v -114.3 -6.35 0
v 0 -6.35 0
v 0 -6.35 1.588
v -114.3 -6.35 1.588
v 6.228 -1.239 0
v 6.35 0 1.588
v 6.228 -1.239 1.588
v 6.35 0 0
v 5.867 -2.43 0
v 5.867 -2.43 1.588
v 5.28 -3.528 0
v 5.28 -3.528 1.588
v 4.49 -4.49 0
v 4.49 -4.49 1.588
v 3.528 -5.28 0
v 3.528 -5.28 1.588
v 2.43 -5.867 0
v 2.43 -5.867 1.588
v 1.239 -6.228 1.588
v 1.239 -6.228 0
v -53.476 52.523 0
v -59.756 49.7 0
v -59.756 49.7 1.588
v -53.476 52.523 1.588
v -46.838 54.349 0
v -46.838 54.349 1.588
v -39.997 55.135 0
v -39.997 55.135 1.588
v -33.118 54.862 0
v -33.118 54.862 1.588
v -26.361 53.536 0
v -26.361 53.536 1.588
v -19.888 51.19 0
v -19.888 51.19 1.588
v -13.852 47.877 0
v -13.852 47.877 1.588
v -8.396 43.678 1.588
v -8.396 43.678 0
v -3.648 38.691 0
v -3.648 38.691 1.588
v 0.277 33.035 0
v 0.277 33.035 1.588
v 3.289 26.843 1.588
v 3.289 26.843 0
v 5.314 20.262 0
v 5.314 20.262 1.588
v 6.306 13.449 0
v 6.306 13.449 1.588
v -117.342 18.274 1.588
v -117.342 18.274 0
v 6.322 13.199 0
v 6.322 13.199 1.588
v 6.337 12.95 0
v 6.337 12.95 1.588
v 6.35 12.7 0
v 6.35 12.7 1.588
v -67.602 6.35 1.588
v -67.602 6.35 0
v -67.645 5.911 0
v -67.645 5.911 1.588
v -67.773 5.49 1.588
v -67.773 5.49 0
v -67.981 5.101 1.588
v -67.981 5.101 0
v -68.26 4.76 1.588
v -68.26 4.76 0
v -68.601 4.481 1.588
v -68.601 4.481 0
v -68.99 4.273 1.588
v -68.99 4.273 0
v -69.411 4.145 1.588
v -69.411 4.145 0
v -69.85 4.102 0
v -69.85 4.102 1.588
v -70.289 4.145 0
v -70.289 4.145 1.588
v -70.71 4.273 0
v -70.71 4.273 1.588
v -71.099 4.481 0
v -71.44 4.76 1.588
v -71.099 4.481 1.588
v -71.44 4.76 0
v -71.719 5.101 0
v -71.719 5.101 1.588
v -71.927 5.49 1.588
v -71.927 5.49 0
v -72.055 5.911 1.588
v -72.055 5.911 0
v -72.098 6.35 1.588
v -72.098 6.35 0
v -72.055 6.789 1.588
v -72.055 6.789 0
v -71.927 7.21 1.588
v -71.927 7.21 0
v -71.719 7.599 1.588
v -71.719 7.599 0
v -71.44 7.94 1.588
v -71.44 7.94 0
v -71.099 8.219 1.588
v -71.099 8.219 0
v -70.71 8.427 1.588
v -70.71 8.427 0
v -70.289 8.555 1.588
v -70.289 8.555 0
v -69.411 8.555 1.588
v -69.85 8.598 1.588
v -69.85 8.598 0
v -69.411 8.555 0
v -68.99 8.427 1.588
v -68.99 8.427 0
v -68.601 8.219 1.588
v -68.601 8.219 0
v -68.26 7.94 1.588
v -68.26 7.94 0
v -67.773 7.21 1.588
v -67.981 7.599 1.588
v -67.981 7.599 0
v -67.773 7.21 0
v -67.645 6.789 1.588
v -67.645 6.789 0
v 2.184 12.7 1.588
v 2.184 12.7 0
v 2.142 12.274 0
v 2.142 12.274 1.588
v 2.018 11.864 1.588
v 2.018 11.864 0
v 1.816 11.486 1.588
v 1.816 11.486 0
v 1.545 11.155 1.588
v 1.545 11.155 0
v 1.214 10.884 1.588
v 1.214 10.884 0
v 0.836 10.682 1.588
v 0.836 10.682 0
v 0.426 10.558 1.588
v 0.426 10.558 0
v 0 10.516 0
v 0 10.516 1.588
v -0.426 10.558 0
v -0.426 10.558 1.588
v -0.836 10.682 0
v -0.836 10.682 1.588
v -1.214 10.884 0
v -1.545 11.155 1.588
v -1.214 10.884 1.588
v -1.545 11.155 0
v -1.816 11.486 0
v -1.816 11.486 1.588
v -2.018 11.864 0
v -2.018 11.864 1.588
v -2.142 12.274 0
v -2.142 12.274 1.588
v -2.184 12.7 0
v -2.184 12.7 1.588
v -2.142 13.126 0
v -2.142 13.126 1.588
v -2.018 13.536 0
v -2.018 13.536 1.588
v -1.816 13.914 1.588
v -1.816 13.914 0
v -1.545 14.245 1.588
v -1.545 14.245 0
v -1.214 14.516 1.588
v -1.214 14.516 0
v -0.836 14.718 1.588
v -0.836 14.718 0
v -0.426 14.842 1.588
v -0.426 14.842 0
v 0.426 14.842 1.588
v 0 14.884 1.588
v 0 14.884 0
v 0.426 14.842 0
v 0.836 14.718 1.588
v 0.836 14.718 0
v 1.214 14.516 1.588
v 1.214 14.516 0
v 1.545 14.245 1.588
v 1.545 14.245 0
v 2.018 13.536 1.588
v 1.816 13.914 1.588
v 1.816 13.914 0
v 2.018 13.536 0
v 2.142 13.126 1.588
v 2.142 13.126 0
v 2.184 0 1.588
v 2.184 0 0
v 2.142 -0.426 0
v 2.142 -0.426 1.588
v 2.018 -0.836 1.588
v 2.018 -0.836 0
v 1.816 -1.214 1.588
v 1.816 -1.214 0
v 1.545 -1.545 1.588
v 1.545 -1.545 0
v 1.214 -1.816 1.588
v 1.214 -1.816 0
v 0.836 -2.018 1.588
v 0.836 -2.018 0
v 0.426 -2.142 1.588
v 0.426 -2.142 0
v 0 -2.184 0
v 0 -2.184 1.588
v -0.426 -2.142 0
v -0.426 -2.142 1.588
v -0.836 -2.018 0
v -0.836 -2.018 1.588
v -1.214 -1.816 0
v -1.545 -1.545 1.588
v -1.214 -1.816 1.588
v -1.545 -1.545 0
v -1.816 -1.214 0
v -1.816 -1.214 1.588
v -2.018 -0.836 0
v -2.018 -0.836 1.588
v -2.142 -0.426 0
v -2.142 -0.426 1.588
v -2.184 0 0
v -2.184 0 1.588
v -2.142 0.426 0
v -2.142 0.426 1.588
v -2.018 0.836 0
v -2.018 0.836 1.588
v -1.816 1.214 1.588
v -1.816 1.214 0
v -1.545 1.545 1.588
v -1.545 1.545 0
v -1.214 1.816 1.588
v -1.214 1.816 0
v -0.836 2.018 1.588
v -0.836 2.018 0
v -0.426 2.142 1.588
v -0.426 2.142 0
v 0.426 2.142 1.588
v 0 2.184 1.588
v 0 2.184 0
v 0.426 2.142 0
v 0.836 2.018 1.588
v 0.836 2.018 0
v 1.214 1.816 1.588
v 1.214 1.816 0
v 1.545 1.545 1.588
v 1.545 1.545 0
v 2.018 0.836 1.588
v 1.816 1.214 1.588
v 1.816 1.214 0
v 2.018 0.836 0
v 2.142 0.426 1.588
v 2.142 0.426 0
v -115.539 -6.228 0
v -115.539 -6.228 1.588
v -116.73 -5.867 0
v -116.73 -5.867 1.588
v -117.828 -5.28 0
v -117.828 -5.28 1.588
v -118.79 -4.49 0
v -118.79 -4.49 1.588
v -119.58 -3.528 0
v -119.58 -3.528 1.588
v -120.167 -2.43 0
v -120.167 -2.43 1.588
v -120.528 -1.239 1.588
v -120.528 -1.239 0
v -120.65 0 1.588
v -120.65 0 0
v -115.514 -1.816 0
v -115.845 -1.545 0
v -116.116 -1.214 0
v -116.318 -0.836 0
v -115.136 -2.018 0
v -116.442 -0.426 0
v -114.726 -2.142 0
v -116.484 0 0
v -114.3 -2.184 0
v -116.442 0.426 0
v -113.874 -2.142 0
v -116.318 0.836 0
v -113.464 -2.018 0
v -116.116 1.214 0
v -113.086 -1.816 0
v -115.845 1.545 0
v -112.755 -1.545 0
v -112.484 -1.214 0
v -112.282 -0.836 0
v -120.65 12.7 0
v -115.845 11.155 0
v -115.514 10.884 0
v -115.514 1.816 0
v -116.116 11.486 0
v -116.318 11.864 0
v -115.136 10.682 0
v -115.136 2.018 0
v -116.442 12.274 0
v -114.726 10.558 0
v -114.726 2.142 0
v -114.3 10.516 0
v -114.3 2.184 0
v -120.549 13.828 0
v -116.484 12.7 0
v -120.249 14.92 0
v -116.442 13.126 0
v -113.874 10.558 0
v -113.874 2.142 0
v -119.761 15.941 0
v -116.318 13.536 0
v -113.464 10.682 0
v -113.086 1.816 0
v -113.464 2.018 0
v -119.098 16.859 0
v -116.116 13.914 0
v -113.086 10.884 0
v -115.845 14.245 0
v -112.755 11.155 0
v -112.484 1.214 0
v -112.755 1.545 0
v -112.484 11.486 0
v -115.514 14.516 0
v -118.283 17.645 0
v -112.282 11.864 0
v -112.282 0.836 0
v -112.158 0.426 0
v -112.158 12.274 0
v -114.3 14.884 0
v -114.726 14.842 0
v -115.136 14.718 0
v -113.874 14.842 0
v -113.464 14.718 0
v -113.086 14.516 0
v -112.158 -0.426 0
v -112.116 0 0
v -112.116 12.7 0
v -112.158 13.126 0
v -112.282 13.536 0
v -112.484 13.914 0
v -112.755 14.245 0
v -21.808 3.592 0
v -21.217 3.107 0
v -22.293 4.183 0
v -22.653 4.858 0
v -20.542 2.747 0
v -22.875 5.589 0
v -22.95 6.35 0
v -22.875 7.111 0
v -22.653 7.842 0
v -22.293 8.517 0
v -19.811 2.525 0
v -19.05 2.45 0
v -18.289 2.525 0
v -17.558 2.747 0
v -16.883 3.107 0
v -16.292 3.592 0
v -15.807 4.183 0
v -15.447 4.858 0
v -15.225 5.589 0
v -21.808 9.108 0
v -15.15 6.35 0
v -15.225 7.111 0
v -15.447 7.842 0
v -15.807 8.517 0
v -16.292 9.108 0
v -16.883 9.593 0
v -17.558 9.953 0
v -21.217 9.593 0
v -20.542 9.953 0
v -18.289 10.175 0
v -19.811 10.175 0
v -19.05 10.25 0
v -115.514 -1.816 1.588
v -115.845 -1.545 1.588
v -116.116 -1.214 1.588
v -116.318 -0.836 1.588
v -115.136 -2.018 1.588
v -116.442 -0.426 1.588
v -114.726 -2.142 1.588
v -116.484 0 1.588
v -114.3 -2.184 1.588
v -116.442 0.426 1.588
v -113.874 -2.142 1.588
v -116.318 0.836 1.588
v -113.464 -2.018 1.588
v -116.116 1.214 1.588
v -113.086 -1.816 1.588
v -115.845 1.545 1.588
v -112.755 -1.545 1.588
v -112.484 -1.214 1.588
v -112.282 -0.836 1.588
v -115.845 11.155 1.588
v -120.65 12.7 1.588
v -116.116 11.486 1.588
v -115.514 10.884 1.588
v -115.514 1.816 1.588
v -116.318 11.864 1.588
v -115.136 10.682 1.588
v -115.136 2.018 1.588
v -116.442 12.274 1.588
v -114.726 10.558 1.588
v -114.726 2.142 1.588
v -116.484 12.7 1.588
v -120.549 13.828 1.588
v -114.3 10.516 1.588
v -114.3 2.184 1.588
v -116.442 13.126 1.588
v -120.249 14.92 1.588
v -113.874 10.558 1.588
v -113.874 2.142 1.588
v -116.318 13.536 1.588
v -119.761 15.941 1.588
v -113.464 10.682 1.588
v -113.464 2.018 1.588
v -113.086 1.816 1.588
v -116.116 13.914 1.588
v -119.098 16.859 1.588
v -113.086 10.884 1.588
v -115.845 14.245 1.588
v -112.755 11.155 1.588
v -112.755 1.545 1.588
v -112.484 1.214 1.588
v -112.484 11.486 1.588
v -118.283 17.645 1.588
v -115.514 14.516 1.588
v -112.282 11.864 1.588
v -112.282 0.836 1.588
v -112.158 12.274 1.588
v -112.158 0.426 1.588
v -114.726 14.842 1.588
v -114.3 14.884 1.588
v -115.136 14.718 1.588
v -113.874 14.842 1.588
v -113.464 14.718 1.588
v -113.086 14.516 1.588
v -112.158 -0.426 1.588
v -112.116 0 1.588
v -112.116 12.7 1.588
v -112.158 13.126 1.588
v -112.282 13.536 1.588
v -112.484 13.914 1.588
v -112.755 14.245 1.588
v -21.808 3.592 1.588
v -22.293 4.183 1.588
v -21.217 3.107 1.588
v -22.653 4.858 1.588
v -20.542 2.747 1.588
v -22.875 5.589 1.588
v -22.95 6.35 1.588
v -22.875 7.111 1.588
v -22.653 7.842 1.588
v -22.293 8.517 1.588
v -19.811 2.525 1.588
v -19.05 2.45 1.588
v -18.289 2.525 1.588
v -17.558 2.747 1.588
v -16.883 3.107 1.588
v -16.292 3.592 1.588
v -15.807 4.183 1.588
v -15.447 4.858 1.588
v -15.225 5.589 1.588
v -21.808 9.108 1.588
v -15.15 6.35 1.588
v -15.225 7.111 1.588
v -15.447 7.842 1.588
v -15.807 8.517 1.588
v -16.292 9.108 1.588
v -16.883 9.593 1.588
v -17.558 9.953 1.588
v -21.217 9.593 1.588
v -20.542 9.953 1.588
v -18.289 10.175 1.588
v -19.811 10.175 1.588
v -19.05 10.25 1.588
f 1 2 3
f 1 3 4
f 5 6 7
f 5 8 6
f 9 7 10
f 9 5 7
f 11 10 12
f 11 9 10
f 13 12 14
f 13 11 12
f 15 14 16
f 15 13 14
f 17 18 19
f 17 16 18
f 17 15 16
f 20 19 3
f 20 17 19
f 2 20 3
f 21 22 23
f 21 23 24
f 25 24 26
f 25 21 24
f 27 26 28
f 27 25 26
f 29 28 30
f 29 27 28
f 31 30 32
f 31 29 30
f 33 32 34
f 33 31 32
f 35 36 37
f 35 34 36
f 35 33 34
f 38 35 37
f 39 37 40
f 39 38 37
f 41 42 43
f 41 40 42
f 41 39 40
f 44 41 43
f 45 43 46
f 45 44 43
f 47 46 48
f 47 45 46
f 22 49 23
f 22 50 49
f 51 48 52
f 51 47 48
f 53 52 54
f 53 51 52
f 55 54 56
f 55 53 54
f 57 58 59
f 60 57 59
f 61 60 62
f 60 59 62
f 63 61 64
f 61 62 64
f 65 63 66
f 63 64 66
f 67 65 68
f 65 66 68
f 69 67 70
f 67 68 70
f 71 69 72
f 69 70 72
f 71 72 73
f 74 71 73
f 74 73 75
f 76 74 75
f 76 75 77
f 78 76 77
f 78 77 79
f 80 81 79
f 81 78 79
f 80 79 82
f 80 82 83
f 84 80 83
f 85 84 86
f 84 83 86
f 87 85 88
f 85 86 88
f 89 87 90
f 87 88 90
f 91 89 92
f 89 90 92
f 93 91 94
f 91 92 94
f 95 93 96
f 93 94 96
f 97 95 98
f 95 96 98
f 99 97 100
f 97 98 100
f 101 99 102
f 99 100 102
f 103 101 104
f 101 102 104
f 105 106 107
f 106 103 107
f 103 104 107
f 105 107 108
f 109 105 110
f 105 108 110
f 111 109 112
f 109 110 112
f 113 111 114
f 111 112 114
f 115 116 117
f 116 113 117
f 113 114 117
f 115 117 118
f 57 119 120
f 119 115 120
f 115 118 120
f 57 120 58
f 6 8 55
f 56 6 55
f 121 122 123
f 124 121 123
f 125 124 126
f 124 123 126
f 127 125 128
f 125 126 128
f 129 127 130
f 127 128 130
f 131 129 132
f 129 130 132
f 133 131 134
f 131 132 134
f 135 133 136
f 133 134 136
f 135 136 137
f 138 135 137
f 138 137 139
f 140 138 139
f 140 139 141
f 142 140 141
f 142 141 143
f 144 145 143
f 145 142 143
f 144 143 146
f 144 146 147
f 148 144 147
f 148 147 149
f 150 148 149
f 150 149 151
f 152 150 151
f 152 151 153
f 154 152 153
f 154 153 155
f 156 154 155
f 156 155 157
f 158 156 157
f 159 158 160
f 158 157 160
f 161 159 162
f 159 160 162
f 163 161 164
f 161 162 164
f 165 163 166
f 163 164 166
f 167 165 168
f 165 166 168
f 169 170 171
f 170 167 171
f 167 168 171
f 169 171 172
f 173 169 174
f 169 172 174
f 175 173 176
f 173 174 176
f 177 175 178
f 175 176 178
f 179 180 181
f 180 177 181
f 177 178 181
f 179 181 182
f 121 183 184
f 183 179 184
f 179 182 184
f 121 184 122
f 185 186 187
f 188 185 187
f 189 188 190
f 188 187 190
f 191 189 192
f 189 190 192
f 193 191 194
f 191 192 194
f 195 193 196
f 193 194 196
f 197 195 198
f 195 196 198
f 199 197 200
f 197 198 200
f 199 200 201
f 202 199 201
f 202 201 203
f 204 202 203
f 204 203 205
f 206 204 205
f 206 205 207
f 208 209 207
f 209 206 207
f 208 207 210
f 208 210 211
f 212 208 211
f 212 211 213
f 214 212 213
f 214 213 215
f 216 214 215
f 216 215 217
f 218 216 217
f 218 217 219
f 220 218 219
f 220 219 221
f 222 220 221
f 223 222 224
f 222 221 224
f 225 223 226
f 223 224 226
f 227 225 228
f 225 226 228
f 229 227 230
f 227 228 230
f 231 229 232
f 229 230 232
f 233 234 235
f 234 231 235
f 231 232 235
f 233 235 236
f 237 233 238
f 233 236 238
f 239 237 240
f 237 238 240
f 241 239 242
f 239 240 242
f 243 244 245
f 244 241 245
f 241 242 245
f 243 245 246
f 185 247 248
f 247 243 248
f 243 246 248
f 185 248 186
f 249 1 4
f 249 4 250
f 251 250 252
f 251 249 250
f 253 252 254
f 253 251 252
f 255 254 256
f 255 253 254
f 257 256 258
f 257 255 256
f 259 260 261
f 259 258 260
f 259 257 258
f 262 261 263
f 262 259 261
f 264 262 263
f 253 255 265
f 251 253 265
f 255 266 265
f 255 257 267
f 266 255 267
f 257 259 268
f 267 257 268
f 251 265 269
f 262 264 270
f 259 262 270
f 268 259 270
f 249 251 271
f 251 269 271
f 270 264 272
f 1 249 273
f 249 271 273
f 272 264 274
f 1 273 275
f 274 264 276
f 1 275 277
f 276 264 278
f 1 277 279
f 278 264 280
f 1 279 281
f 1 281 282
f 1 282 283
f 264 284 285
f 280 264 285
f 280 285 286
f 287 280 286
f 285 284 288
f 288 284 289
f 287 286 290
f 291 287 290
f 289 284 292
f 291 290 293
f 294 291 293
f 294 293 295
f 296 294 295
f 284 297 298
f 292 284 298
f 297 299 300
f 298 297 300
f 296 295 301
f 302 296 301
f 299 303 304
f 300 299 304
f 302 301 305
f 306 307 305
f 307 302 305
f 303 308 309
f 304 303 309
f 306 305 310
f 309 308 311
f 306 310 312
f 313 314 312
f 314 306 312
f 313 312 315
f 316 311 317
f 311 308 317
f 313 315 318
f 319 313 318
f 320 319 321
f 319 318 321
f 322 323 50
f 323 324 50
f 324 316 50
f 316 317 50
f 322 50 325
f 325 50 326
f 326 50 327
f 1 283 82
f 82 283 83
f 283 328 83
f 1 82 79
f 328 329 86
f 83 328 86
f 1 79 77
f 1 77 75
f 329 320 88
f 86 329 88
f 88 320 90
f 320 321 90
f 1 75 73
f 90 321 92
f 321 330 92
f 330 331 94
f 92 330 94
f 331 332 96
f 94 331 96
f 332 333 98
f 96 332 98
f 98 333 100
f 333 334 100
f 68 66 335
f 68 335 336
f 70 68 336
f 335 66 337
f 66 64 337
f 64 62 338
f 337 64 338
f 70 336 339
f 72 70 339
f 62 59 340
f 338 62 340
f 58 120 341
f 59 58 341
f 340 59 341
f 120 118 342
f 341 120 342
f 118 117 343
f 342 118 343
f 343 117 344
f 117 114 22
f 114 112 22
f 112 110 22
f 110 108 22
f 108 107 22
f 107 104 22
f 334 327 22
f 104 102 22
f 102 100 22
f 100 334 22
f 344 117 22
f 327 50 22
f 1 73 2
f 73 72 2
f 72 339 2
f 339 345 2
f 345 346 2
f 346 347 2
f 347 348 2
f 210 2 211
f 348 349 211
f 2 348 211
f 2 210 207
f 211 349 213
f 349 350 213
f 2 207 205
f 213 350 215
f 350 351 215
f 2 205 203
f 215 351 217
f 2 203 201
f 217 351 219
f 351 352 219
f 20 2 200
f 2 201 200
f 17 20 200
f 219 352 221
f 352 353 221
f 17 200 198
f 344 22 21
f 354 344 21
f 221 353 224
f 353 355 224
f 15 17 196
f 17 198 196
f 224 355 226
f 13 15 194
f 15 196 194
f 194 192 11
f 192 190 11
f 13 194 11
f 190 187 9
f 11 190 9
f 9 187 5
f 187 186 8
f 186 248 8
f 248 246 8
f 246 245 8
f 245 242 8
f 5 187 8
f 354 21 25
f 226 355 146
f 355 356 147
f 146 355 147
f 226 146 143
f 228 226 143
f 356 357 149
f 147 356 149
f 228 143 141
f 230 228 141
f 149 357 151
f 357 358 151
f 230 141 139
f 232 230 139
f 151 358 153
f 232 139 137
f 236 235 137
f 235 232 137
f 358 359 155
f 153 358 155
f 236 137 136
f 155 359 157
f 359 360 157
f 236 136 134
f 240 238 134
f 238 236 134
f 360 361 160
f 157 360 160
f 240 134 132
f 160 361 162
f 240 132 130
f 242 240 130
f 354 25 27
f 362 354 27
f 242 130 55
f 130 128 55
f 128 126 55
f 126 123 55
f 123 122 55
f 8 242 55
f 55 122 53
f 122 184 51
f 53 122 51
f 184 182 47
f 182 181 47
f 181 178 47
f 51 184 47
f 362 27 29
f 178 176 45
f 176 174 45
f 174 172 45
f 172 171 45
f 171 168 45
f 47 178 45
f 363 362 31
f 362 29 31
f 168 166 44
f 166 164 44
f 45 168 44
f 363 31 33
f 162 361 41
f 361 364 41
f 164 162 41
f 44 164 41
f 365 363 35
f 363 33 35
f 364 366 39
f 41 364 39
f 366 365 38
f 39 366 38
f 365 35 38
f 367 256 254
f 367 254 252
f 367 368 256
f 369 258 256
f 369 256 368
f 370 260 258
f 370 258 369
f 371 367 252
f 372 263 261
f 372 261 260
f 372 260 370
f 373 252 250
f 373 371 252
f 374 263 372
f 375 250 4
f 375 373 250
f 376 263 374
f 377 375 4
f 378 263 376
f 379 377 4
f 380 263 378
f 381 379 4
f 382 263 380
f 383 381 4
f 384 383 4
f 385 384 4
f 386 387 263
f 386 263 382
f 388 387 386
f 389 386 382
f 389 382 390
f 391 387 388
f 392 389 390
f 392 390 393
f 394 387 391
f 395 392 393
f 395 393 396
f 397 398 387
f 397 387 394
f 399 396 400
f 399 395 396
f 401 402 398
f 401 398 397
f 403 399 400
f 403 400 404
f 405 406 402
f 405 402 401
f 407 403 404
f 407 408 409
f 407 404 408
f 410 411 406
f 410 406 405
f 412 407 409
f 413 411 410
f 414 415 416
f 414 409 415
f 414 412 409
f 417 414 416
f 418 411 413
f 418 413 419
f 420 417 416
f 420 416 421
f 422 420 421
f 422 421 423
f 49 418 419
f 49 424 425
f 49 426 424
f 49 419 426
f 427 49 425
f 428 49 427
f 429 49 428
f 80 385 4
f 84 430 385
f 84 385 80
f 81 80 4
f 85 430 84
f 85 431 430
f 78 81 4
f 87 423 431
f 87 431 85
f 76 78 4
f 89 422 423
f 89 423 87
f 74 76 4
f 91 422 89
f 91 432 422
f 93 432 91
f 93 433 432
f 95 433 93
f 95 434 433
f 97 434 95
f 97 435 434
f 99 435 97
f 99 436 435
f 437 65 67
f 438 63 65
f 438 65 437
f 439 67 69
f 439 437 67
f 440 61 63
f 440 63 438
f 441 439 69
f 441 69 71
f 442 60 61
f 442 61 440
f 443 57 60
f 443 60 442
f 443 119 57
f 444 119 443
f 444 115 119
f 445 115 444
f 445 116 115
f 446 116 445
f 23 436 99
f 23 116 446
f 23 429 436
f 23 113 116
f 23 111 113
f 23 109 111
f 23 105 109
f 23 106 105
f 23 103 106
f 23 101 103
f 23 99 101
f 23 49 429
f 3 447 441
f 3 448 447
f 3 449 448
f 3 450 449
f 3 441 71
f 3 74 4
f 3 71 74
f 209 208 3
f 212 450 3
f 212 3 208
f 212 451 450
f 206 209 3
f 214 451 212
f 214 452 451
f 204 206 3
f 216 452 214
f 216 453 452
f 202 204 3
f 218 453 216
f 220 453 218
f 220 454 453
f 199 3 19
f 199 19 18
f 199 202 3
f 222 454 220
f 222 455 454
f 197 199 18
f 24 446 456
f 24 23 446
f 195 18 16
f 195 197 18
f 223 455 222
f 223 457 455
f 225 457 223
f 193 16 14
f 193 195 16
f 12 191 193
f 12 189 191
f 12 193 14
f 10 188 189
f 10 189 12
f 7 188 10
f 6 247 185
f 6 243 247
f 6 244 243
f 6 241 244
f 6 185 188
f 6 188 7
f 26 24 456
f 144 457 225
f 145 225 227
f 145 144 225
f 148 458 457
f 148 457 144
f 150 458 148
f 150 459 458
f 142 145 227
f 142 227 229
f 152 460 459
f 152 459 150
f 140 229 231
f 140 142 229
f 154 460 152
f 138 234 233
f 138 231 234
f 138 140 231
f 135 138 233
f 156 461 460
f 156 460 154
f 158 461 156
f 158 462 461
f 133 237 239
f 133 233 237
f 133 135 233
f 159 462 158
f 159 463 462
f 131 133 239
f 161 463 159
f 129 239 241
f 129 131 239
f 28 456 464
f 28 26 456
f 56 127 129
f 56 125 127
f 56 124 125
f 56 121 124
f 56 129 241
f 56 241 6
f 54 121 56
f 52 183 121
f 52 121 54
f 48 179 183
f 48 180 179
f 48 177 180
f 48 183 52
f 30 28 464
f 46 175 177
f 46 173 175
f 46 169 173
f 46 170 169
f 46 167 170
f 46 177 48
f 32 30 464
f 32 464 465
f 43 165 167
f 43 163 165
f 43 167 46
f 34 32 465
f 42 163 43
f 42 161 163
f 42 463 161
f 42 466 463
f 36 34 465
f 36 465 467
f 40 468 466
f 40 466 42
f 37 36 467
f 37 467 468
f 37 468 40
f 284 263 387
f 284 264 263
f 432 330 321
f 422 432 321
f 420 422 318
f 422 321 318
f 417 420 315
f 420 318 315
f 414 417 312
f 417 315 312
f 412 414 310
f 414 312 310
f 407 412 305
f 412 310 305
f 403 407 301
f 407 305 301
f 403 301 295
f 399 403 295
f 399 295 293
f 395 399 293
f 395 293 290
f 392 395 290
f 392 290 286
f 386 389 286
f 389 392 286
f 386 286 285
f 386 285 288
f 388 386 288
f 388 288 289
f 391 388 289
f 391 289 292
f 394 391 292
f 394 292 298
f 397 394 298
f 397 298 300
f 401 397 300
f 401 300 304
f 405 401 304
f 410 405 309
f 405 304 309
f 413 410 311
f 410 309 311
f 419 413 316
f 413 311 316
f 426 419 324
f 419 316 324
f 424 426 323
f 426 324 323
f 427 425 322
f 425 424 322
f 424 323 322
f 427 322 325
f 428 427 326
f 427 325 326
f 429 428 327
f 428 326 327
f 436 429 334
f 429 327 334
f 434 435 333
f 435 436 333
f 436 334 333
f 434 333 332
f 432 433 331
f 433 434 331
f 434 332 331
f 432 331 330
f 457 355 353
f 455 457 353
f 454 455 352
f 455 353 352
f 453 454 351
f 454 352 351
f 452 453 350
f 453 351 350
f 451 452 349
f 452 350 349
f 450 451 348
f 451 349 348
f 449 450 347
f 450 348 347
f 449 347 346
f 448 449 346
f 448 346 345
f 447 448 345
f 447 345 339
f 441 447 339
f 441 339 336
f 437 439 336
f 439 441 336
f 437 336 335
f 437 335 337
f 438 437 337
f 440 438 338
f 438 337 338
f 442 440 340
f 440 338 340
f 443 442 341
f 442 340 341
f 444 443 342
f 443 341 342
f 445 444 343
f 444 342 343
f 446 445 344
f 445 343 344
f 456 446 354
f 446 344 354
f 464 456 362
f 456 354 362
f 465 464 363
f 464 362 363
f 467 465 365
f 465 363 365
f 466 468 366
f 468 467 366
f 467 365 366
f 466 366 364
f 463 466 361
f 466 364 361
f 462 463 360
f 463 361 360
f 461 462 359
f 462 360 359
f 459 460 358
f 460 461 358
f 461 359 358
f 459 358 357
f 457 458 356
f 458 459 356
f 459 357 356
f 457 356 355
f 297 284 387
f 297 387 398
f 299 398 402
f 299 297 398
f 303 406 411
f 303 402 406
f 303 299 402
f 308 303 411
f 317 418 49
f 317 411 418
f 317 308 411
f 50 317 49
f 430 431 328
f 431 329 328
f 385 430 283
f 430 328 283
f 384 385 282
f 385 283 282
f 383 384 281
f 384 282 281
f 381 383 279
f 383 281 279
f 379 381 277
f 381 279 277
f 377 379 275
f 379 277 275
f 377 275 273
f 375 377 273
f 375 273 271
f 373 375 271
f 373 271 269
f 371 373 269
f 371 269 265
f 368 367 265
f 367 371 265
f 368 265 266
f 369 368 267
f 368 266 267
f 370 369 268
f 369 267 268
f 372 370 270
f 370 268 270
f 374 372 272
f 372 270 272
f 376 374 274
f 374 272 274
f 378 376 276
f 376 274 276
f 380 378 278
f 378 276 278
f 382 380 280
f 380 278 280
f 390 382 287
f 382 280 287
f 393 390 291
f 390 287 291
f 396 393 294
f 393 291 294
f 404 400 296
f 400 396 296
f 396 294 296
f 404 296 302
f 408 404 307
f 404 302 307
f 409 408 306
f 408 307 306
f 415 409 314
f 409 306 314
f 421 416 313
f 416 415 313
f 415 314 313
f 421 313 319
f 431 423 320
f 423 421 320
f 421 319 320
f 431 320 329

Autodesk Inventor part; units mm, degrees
ref_plane "YZ Plane" through (0, 0, 0) normal (1, 0, 0) x (0, 1, 0)
ref_plane "XZ Plane" through (0, 0, 0) normal (0, 1, 0) x (-1, 0, 0)
ref_plane "XY Plane" through (0, 0, 0) normal (0, 0, 1) x (1, 0, 0)
sketch "main" plane through (0, 0, 0) normal (0, 0, 1) x (1, 0, 0)
  circle A0 centre (50.5981, -28.4488) radius 2.1844
  line L0 (-66.7437, -10.1747) -> (-9.1578, 21.251)
  line L1 (50.5981, -34.7988) -> (-63.7019, -34.7988)
  circle A1 centre (50.5981, -15.7488) radius 2.1844
  arc A2 (50.5981, -34.7988) -> (56.9481, -28.4488) centre (50.5981, -28.4488) ccw
  line L2 (56.9481, -28.4488) -> (56.9481, -15.7488)
  arc A3 (56.9481, -15.7488) -> (56.9038, -14.9999) centre (50.5981, -15.7488) ccw
  arc A4 (56.9481, -15.7488) -> (-9.1578, 21.251) centre (12.2713, -18.0166) ccw
  circle A5 centre (31.5481, -22.0988) radius 3.9
  circle A6 centre (-19.2519, -22.0988) radius 2.2479
  circle A7 centre (-63.7019, -28.4488) radius 2.1844
  circle A8 centre (-63.7019, -15.7488) radius 2.1844
  arc A9 (-66.7437, -10.1747) -> (-70.0519, -15.7488) centre (-63.7019, -15.7488) ccw
  line L3 (-70.0519, -28.4488) -> (-70.0519, -15.7488)
  arc A10 (-70.0519, -28.4488) -> (-63.7019, -34.7988) centre (-63.7019, -28.4488) ccw
  point P0 (-3.3794, -19.3684)
  dimension "d0" = 7.8
  dimension "d1" = 4.4958
sketch "Sketch1" plane through (0, 0, 0) normal (0, 0, 1) x (1, 0, 0)
  circle A0 centre (0, 0) radius 2.1844
  line L0 (-117.3419, 18.274) -> (-59.7559, 49.6998)
  line L1 (0, -6.35) -> (-114.3, -6.35)
  circle A1 centre (0, 12.7) radius 2.1844
  arc A2 (0, -6.35) -> (6.35, 0) centre (0, 0) ccw
  line L2 (6.35, 0) -> (6.35, 12.7)
  arc A3 (6.35, 12.7) -> (6.3057, 13.4489) centre (0, 12.7) ccw
  arc A4 (6.35, 12.7) -> (-59.7559, 49.6998) centre (-38.3268, 10.4321) ccw
  circle A5 centre (-19.05, 6.35) radius 3.9
  circle A6 centre (-69.85, 6.35) radius 2.2479
  circle A7 centre (-114.3, 0) radius 2.1844
  circle A8 centre (-114.3, 12.7) radius 2.1844
  arc A9 (-117.3419, 18.274) -> (-120.65, 12.7) centre (-114.3, 12.7) ccw
  line L3 (-120.65, 0) -> (-120.65, 12.7)
  arc A10 (-120.65, 0) -> (-114.3, -6.35) centre (-114.3, 0) ccw
extrude "Extrusion1" add sketch "Sketch1" along normal blind 1.5875 contours L0 A4 L2 A2 L1 A10 L3 A9
properties part number "intake_sled" material "Acetal Resin, White"
